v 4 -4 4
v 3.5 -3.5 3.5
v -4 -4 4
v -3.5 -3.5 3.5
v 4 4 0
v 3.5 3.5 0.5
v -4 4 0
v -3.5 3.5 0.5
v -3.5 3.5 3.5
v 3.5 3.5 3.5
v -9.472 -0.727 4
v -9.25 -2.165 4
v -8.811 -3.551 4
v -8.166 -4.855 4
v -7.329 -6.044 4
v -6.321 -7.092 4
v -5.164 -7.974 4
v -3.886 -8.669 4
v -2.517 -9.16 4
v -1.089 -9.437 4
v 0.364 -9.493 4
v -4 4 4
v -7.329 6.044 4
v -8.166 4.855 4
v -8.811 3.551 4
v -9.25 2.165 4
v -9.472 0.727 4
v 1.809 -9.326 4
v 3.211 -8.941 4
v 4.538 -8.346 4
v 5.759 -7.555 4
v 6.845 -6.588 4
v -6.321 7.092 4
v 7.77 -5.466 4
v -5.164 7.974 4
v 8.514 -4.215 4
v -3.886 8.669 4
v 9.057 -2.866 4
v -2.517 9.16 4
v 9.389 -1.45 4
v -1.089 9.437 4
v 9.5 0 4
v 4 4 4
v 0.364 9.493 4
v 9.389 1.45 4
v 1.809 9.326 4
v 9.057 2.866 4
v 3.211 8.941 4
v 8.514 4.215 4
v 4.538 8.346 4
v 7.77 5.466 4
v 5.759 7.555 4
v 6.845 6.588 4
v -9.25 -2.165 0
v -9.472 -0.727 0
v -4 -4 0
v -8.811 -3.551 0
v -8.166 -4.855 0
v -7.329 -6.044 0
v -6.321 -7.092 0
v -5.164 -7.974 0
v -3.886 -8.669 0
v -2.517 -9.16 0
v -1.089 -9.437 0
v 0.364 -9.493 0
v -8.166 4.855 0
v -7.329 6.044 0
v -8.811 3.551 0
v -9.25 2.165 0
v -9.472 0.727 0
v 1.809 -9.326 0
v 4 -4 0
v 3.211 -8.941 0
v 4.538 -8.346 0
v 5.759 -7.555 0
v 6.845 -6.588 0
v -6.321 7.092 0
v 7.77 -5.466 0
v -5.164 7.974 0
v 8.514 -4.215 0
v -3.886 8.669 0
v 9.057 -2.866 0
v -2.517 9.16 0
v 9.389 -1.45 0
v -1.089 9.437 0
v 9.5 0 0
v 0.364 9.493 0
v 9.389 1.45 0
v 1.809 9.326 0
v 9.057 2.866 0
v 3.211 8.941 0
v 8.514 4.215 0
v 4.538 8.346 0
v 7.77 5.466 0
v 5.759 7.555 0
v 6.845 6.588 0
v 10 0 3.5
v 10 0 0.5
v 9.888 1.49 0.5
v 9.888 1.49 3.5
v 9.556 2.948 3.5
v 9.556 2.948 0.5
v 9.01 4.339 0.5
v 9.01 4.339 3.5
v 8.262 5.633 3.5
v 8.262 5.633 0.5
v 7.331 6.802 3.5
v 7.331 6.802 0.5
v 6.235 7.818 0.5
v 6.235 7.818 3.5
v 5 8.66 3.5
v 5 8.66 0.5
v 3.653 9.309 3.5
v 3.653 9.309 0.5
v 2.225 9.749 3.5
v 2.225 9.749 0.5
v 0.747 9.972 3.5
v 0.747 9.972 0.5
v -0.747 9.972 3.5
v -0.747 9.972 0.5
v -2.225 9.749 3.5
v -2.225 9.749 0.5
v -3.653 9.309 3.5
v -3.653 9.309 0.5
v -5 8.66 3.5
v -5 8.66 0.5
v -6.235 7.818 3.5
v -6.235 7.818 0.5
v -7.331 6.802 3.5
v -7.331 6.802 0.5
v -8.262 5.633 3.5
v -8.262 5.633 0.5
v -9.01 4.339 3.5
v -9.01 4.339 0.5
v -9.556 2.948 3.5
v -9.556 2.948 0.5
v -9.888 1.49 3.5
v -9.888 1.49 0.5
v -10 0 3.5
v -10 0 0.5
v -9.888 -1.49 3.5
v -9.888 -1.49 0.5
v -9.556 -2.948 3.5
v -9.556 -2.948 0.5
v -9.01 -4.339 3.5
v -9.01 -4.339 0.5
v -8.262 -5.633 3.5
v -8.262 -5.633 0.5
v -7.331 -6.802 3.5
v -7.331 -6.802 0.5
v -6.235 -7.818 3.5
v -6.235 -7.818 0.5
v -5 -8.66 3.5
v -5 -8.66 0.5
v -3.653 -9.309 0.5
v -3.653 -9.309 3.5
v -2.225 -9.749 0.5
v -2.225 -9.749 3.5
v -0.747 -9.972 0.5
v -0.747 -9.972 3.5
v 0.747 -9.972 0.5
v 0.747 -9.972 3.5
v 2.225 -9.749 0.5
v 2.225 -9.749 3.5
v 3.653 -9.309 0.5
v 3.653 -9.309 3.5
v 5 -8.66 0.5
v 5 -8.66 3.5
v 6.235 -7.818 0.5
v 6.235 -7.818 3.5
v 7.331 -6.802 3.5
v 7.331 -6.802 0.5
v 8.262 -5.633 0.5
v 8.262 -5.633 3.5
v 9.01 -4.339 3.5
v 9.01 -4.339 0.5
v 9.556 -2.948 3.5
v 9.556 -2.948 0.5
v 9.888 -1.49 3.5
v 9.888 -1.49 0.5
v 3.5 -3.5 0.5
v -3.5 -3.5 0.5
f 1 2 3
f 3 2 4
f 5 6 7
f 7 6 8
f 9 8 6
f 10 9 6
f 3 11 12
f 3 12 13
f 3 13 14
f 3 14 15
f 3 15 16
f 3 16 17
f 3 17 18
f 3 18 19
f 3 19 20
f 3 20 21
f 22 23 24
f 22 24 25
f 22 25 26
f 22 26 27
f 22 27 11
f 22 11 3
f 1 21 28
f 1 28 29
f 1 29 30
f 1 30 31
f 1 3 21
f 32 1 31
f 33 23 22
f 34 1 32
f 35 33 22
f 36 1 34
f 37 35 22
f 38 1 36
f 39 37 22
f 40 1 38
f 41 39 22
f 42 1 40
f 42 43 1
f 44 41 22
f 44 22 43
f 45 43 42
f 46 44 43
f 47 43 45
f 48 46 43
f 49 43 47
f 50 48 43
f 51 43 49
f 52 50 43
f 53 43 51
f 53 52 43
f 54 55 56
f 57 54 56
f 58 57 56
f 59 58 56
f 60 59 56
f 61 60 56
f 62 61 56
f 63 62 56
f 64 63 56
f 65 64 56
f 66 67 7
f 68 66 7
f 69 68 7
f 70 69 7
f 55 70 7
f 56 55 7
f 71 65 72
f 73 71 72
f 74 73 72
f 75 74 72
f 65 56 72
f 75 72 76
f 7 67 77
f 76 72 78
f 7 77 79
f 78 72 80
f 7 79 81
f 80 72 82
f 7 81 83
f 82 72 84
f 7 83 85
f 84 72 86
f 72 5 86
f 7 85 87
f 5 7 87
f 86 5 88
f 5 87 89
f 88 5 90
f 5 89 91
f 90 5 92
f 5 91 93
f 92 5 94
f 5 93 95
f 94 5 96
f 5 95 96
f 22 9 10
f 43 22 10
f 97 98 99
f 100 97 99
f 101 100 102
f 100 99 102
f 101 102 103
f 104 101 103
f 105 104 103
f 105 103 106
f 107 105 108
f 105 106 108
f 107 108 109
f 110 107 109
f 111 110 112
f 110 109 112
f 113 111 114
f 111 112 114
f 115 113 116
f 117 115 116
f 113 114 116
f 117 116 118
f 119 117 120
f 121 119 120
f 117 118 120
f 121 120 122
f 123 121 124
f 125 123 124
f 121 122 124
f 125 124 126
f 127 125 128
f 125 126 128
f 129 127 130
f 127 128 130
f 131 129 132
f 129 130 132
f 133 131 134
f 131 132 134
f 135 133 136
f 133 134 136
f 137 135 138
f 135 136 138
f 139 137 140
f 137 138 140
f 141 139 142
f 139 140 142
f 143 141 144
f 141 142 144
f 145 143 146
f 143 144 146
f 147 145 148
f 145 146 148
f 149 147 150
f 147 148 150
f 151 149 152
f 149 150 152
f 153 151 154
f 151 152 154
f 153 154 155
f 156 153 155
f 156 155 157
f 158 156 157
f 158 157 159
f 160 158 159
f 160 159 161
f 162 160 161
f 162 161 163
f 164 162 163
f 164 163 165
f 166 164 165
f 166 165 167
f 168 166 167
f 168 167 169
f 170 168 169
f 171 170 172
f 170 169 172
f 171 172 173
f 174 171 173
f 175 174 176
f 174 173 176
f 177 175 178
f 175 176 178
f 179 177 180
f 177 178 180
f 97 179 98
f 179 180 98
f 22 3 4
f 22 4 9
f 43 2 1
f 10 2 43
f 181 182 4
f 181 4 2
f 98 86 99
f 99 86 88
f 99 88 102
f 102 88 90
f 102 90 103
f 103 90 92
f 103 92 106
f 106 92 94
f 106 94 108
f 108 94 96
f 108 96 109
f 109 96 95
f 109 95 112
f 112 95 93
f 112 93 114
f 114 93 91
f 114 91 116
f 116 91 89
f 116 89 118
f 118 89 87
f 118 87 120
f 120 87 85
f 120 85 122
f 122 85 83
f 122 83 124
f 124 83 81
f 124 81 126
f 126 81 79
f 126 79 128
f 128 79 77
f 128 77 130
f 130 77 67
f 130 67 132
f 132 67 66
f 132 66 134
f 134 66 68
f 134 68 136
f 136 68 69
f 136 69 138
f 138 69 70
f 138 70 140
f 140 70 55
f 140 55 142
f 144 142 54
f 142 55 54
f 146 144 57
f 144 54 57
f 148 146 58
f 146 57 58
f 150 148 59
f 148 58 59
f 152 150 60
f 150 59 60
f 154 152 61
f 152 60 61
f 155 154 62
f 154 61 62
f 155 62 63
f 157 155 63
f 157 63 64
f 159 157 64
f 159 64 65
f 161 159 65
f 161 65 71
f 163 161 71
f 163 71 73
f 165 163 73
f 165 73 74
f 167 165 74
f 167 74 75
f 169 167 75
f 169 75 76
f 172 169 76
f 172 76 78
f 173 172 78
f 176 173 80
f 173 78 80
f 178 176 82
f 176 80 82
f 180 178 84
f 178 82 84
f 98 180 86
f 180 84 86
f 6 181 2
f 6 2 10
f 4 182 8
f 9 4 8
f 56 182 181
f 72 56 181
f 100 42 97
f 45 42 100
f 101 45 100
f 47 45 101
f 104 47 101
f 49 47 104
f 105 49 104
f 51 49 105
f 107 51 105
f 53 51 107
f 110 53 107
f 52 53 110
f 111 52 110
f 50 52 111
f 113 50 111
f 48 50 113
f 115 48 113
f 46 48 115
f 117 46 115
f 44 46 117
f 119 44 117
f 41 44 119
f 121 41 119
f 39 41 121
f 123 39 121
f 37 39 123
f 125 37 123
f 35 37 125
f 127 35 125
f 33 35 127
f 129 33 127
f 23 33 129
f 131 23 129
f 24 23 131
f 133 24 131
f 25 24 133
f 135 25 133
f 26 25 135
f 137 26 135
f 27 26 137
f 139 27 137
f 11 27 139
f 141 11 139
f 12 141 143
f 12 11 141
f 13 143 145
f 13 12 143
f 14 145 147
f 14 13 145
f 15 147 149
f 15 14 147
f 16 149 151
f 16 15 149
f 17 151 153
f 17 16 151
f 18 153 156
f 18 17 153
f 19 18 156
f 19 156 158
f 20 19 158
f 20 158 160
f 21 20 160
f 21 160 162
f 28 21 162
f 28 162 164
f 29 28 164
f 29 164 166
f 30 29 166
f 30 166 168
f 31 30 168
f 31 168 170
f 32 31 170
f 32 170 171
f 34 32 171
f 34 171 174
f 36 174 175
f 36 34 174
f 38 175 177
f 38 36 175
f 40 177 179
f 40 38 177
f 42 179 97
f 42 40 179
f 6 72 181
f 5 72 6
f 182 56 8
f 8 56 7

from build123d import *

# Parameters (mm, degrees)
F0_R     = 10
F0_W     = 7
F0_H     = 7
F1_DEPTH = 4
F2_SIZE  = 0.5
F3_SIZE  = 0.5


with BuildPart() as f1:
    # F0 (on Top) → F1 (new body)
    with BuildSketch(Plane.XY):
        Circle(F0_R)
        Rectangle(F0_W, F0_H, mode=Mode.SUBTRACT)
    extrude(amount=F1_DEPTH)

    # F2
    f2_edges = [f1.edges().sort_by_distance(p)[0] for p in [
        (-10, 0, 4),
        (-10, 0, 0),
        (-3.5, 0, 0),
        (-3.5, 0, 4),
    ]]
    chamfer(f2_edges, length=F2_SIZE)

    # F3
    f3_edges = [f1.edges().sort_by_distance(p)[0] for p in [
        (0, 3.5, 4),
        (3.5, 0, 4),
        (0, -3.5, 4),
        (0, -3.5, 0),
        (0, 3.5, 0),
        (3.5, 0, 0),
        (-3.75, -3.5, 0),
        (-3.75, 3.5, 0),
        (-3.75, -3.5, 4),
        (-3.75, 3.5, 4),
    ]]
    chamfer(f3_edges, length=F3_SIZE)


solid = f1.part
